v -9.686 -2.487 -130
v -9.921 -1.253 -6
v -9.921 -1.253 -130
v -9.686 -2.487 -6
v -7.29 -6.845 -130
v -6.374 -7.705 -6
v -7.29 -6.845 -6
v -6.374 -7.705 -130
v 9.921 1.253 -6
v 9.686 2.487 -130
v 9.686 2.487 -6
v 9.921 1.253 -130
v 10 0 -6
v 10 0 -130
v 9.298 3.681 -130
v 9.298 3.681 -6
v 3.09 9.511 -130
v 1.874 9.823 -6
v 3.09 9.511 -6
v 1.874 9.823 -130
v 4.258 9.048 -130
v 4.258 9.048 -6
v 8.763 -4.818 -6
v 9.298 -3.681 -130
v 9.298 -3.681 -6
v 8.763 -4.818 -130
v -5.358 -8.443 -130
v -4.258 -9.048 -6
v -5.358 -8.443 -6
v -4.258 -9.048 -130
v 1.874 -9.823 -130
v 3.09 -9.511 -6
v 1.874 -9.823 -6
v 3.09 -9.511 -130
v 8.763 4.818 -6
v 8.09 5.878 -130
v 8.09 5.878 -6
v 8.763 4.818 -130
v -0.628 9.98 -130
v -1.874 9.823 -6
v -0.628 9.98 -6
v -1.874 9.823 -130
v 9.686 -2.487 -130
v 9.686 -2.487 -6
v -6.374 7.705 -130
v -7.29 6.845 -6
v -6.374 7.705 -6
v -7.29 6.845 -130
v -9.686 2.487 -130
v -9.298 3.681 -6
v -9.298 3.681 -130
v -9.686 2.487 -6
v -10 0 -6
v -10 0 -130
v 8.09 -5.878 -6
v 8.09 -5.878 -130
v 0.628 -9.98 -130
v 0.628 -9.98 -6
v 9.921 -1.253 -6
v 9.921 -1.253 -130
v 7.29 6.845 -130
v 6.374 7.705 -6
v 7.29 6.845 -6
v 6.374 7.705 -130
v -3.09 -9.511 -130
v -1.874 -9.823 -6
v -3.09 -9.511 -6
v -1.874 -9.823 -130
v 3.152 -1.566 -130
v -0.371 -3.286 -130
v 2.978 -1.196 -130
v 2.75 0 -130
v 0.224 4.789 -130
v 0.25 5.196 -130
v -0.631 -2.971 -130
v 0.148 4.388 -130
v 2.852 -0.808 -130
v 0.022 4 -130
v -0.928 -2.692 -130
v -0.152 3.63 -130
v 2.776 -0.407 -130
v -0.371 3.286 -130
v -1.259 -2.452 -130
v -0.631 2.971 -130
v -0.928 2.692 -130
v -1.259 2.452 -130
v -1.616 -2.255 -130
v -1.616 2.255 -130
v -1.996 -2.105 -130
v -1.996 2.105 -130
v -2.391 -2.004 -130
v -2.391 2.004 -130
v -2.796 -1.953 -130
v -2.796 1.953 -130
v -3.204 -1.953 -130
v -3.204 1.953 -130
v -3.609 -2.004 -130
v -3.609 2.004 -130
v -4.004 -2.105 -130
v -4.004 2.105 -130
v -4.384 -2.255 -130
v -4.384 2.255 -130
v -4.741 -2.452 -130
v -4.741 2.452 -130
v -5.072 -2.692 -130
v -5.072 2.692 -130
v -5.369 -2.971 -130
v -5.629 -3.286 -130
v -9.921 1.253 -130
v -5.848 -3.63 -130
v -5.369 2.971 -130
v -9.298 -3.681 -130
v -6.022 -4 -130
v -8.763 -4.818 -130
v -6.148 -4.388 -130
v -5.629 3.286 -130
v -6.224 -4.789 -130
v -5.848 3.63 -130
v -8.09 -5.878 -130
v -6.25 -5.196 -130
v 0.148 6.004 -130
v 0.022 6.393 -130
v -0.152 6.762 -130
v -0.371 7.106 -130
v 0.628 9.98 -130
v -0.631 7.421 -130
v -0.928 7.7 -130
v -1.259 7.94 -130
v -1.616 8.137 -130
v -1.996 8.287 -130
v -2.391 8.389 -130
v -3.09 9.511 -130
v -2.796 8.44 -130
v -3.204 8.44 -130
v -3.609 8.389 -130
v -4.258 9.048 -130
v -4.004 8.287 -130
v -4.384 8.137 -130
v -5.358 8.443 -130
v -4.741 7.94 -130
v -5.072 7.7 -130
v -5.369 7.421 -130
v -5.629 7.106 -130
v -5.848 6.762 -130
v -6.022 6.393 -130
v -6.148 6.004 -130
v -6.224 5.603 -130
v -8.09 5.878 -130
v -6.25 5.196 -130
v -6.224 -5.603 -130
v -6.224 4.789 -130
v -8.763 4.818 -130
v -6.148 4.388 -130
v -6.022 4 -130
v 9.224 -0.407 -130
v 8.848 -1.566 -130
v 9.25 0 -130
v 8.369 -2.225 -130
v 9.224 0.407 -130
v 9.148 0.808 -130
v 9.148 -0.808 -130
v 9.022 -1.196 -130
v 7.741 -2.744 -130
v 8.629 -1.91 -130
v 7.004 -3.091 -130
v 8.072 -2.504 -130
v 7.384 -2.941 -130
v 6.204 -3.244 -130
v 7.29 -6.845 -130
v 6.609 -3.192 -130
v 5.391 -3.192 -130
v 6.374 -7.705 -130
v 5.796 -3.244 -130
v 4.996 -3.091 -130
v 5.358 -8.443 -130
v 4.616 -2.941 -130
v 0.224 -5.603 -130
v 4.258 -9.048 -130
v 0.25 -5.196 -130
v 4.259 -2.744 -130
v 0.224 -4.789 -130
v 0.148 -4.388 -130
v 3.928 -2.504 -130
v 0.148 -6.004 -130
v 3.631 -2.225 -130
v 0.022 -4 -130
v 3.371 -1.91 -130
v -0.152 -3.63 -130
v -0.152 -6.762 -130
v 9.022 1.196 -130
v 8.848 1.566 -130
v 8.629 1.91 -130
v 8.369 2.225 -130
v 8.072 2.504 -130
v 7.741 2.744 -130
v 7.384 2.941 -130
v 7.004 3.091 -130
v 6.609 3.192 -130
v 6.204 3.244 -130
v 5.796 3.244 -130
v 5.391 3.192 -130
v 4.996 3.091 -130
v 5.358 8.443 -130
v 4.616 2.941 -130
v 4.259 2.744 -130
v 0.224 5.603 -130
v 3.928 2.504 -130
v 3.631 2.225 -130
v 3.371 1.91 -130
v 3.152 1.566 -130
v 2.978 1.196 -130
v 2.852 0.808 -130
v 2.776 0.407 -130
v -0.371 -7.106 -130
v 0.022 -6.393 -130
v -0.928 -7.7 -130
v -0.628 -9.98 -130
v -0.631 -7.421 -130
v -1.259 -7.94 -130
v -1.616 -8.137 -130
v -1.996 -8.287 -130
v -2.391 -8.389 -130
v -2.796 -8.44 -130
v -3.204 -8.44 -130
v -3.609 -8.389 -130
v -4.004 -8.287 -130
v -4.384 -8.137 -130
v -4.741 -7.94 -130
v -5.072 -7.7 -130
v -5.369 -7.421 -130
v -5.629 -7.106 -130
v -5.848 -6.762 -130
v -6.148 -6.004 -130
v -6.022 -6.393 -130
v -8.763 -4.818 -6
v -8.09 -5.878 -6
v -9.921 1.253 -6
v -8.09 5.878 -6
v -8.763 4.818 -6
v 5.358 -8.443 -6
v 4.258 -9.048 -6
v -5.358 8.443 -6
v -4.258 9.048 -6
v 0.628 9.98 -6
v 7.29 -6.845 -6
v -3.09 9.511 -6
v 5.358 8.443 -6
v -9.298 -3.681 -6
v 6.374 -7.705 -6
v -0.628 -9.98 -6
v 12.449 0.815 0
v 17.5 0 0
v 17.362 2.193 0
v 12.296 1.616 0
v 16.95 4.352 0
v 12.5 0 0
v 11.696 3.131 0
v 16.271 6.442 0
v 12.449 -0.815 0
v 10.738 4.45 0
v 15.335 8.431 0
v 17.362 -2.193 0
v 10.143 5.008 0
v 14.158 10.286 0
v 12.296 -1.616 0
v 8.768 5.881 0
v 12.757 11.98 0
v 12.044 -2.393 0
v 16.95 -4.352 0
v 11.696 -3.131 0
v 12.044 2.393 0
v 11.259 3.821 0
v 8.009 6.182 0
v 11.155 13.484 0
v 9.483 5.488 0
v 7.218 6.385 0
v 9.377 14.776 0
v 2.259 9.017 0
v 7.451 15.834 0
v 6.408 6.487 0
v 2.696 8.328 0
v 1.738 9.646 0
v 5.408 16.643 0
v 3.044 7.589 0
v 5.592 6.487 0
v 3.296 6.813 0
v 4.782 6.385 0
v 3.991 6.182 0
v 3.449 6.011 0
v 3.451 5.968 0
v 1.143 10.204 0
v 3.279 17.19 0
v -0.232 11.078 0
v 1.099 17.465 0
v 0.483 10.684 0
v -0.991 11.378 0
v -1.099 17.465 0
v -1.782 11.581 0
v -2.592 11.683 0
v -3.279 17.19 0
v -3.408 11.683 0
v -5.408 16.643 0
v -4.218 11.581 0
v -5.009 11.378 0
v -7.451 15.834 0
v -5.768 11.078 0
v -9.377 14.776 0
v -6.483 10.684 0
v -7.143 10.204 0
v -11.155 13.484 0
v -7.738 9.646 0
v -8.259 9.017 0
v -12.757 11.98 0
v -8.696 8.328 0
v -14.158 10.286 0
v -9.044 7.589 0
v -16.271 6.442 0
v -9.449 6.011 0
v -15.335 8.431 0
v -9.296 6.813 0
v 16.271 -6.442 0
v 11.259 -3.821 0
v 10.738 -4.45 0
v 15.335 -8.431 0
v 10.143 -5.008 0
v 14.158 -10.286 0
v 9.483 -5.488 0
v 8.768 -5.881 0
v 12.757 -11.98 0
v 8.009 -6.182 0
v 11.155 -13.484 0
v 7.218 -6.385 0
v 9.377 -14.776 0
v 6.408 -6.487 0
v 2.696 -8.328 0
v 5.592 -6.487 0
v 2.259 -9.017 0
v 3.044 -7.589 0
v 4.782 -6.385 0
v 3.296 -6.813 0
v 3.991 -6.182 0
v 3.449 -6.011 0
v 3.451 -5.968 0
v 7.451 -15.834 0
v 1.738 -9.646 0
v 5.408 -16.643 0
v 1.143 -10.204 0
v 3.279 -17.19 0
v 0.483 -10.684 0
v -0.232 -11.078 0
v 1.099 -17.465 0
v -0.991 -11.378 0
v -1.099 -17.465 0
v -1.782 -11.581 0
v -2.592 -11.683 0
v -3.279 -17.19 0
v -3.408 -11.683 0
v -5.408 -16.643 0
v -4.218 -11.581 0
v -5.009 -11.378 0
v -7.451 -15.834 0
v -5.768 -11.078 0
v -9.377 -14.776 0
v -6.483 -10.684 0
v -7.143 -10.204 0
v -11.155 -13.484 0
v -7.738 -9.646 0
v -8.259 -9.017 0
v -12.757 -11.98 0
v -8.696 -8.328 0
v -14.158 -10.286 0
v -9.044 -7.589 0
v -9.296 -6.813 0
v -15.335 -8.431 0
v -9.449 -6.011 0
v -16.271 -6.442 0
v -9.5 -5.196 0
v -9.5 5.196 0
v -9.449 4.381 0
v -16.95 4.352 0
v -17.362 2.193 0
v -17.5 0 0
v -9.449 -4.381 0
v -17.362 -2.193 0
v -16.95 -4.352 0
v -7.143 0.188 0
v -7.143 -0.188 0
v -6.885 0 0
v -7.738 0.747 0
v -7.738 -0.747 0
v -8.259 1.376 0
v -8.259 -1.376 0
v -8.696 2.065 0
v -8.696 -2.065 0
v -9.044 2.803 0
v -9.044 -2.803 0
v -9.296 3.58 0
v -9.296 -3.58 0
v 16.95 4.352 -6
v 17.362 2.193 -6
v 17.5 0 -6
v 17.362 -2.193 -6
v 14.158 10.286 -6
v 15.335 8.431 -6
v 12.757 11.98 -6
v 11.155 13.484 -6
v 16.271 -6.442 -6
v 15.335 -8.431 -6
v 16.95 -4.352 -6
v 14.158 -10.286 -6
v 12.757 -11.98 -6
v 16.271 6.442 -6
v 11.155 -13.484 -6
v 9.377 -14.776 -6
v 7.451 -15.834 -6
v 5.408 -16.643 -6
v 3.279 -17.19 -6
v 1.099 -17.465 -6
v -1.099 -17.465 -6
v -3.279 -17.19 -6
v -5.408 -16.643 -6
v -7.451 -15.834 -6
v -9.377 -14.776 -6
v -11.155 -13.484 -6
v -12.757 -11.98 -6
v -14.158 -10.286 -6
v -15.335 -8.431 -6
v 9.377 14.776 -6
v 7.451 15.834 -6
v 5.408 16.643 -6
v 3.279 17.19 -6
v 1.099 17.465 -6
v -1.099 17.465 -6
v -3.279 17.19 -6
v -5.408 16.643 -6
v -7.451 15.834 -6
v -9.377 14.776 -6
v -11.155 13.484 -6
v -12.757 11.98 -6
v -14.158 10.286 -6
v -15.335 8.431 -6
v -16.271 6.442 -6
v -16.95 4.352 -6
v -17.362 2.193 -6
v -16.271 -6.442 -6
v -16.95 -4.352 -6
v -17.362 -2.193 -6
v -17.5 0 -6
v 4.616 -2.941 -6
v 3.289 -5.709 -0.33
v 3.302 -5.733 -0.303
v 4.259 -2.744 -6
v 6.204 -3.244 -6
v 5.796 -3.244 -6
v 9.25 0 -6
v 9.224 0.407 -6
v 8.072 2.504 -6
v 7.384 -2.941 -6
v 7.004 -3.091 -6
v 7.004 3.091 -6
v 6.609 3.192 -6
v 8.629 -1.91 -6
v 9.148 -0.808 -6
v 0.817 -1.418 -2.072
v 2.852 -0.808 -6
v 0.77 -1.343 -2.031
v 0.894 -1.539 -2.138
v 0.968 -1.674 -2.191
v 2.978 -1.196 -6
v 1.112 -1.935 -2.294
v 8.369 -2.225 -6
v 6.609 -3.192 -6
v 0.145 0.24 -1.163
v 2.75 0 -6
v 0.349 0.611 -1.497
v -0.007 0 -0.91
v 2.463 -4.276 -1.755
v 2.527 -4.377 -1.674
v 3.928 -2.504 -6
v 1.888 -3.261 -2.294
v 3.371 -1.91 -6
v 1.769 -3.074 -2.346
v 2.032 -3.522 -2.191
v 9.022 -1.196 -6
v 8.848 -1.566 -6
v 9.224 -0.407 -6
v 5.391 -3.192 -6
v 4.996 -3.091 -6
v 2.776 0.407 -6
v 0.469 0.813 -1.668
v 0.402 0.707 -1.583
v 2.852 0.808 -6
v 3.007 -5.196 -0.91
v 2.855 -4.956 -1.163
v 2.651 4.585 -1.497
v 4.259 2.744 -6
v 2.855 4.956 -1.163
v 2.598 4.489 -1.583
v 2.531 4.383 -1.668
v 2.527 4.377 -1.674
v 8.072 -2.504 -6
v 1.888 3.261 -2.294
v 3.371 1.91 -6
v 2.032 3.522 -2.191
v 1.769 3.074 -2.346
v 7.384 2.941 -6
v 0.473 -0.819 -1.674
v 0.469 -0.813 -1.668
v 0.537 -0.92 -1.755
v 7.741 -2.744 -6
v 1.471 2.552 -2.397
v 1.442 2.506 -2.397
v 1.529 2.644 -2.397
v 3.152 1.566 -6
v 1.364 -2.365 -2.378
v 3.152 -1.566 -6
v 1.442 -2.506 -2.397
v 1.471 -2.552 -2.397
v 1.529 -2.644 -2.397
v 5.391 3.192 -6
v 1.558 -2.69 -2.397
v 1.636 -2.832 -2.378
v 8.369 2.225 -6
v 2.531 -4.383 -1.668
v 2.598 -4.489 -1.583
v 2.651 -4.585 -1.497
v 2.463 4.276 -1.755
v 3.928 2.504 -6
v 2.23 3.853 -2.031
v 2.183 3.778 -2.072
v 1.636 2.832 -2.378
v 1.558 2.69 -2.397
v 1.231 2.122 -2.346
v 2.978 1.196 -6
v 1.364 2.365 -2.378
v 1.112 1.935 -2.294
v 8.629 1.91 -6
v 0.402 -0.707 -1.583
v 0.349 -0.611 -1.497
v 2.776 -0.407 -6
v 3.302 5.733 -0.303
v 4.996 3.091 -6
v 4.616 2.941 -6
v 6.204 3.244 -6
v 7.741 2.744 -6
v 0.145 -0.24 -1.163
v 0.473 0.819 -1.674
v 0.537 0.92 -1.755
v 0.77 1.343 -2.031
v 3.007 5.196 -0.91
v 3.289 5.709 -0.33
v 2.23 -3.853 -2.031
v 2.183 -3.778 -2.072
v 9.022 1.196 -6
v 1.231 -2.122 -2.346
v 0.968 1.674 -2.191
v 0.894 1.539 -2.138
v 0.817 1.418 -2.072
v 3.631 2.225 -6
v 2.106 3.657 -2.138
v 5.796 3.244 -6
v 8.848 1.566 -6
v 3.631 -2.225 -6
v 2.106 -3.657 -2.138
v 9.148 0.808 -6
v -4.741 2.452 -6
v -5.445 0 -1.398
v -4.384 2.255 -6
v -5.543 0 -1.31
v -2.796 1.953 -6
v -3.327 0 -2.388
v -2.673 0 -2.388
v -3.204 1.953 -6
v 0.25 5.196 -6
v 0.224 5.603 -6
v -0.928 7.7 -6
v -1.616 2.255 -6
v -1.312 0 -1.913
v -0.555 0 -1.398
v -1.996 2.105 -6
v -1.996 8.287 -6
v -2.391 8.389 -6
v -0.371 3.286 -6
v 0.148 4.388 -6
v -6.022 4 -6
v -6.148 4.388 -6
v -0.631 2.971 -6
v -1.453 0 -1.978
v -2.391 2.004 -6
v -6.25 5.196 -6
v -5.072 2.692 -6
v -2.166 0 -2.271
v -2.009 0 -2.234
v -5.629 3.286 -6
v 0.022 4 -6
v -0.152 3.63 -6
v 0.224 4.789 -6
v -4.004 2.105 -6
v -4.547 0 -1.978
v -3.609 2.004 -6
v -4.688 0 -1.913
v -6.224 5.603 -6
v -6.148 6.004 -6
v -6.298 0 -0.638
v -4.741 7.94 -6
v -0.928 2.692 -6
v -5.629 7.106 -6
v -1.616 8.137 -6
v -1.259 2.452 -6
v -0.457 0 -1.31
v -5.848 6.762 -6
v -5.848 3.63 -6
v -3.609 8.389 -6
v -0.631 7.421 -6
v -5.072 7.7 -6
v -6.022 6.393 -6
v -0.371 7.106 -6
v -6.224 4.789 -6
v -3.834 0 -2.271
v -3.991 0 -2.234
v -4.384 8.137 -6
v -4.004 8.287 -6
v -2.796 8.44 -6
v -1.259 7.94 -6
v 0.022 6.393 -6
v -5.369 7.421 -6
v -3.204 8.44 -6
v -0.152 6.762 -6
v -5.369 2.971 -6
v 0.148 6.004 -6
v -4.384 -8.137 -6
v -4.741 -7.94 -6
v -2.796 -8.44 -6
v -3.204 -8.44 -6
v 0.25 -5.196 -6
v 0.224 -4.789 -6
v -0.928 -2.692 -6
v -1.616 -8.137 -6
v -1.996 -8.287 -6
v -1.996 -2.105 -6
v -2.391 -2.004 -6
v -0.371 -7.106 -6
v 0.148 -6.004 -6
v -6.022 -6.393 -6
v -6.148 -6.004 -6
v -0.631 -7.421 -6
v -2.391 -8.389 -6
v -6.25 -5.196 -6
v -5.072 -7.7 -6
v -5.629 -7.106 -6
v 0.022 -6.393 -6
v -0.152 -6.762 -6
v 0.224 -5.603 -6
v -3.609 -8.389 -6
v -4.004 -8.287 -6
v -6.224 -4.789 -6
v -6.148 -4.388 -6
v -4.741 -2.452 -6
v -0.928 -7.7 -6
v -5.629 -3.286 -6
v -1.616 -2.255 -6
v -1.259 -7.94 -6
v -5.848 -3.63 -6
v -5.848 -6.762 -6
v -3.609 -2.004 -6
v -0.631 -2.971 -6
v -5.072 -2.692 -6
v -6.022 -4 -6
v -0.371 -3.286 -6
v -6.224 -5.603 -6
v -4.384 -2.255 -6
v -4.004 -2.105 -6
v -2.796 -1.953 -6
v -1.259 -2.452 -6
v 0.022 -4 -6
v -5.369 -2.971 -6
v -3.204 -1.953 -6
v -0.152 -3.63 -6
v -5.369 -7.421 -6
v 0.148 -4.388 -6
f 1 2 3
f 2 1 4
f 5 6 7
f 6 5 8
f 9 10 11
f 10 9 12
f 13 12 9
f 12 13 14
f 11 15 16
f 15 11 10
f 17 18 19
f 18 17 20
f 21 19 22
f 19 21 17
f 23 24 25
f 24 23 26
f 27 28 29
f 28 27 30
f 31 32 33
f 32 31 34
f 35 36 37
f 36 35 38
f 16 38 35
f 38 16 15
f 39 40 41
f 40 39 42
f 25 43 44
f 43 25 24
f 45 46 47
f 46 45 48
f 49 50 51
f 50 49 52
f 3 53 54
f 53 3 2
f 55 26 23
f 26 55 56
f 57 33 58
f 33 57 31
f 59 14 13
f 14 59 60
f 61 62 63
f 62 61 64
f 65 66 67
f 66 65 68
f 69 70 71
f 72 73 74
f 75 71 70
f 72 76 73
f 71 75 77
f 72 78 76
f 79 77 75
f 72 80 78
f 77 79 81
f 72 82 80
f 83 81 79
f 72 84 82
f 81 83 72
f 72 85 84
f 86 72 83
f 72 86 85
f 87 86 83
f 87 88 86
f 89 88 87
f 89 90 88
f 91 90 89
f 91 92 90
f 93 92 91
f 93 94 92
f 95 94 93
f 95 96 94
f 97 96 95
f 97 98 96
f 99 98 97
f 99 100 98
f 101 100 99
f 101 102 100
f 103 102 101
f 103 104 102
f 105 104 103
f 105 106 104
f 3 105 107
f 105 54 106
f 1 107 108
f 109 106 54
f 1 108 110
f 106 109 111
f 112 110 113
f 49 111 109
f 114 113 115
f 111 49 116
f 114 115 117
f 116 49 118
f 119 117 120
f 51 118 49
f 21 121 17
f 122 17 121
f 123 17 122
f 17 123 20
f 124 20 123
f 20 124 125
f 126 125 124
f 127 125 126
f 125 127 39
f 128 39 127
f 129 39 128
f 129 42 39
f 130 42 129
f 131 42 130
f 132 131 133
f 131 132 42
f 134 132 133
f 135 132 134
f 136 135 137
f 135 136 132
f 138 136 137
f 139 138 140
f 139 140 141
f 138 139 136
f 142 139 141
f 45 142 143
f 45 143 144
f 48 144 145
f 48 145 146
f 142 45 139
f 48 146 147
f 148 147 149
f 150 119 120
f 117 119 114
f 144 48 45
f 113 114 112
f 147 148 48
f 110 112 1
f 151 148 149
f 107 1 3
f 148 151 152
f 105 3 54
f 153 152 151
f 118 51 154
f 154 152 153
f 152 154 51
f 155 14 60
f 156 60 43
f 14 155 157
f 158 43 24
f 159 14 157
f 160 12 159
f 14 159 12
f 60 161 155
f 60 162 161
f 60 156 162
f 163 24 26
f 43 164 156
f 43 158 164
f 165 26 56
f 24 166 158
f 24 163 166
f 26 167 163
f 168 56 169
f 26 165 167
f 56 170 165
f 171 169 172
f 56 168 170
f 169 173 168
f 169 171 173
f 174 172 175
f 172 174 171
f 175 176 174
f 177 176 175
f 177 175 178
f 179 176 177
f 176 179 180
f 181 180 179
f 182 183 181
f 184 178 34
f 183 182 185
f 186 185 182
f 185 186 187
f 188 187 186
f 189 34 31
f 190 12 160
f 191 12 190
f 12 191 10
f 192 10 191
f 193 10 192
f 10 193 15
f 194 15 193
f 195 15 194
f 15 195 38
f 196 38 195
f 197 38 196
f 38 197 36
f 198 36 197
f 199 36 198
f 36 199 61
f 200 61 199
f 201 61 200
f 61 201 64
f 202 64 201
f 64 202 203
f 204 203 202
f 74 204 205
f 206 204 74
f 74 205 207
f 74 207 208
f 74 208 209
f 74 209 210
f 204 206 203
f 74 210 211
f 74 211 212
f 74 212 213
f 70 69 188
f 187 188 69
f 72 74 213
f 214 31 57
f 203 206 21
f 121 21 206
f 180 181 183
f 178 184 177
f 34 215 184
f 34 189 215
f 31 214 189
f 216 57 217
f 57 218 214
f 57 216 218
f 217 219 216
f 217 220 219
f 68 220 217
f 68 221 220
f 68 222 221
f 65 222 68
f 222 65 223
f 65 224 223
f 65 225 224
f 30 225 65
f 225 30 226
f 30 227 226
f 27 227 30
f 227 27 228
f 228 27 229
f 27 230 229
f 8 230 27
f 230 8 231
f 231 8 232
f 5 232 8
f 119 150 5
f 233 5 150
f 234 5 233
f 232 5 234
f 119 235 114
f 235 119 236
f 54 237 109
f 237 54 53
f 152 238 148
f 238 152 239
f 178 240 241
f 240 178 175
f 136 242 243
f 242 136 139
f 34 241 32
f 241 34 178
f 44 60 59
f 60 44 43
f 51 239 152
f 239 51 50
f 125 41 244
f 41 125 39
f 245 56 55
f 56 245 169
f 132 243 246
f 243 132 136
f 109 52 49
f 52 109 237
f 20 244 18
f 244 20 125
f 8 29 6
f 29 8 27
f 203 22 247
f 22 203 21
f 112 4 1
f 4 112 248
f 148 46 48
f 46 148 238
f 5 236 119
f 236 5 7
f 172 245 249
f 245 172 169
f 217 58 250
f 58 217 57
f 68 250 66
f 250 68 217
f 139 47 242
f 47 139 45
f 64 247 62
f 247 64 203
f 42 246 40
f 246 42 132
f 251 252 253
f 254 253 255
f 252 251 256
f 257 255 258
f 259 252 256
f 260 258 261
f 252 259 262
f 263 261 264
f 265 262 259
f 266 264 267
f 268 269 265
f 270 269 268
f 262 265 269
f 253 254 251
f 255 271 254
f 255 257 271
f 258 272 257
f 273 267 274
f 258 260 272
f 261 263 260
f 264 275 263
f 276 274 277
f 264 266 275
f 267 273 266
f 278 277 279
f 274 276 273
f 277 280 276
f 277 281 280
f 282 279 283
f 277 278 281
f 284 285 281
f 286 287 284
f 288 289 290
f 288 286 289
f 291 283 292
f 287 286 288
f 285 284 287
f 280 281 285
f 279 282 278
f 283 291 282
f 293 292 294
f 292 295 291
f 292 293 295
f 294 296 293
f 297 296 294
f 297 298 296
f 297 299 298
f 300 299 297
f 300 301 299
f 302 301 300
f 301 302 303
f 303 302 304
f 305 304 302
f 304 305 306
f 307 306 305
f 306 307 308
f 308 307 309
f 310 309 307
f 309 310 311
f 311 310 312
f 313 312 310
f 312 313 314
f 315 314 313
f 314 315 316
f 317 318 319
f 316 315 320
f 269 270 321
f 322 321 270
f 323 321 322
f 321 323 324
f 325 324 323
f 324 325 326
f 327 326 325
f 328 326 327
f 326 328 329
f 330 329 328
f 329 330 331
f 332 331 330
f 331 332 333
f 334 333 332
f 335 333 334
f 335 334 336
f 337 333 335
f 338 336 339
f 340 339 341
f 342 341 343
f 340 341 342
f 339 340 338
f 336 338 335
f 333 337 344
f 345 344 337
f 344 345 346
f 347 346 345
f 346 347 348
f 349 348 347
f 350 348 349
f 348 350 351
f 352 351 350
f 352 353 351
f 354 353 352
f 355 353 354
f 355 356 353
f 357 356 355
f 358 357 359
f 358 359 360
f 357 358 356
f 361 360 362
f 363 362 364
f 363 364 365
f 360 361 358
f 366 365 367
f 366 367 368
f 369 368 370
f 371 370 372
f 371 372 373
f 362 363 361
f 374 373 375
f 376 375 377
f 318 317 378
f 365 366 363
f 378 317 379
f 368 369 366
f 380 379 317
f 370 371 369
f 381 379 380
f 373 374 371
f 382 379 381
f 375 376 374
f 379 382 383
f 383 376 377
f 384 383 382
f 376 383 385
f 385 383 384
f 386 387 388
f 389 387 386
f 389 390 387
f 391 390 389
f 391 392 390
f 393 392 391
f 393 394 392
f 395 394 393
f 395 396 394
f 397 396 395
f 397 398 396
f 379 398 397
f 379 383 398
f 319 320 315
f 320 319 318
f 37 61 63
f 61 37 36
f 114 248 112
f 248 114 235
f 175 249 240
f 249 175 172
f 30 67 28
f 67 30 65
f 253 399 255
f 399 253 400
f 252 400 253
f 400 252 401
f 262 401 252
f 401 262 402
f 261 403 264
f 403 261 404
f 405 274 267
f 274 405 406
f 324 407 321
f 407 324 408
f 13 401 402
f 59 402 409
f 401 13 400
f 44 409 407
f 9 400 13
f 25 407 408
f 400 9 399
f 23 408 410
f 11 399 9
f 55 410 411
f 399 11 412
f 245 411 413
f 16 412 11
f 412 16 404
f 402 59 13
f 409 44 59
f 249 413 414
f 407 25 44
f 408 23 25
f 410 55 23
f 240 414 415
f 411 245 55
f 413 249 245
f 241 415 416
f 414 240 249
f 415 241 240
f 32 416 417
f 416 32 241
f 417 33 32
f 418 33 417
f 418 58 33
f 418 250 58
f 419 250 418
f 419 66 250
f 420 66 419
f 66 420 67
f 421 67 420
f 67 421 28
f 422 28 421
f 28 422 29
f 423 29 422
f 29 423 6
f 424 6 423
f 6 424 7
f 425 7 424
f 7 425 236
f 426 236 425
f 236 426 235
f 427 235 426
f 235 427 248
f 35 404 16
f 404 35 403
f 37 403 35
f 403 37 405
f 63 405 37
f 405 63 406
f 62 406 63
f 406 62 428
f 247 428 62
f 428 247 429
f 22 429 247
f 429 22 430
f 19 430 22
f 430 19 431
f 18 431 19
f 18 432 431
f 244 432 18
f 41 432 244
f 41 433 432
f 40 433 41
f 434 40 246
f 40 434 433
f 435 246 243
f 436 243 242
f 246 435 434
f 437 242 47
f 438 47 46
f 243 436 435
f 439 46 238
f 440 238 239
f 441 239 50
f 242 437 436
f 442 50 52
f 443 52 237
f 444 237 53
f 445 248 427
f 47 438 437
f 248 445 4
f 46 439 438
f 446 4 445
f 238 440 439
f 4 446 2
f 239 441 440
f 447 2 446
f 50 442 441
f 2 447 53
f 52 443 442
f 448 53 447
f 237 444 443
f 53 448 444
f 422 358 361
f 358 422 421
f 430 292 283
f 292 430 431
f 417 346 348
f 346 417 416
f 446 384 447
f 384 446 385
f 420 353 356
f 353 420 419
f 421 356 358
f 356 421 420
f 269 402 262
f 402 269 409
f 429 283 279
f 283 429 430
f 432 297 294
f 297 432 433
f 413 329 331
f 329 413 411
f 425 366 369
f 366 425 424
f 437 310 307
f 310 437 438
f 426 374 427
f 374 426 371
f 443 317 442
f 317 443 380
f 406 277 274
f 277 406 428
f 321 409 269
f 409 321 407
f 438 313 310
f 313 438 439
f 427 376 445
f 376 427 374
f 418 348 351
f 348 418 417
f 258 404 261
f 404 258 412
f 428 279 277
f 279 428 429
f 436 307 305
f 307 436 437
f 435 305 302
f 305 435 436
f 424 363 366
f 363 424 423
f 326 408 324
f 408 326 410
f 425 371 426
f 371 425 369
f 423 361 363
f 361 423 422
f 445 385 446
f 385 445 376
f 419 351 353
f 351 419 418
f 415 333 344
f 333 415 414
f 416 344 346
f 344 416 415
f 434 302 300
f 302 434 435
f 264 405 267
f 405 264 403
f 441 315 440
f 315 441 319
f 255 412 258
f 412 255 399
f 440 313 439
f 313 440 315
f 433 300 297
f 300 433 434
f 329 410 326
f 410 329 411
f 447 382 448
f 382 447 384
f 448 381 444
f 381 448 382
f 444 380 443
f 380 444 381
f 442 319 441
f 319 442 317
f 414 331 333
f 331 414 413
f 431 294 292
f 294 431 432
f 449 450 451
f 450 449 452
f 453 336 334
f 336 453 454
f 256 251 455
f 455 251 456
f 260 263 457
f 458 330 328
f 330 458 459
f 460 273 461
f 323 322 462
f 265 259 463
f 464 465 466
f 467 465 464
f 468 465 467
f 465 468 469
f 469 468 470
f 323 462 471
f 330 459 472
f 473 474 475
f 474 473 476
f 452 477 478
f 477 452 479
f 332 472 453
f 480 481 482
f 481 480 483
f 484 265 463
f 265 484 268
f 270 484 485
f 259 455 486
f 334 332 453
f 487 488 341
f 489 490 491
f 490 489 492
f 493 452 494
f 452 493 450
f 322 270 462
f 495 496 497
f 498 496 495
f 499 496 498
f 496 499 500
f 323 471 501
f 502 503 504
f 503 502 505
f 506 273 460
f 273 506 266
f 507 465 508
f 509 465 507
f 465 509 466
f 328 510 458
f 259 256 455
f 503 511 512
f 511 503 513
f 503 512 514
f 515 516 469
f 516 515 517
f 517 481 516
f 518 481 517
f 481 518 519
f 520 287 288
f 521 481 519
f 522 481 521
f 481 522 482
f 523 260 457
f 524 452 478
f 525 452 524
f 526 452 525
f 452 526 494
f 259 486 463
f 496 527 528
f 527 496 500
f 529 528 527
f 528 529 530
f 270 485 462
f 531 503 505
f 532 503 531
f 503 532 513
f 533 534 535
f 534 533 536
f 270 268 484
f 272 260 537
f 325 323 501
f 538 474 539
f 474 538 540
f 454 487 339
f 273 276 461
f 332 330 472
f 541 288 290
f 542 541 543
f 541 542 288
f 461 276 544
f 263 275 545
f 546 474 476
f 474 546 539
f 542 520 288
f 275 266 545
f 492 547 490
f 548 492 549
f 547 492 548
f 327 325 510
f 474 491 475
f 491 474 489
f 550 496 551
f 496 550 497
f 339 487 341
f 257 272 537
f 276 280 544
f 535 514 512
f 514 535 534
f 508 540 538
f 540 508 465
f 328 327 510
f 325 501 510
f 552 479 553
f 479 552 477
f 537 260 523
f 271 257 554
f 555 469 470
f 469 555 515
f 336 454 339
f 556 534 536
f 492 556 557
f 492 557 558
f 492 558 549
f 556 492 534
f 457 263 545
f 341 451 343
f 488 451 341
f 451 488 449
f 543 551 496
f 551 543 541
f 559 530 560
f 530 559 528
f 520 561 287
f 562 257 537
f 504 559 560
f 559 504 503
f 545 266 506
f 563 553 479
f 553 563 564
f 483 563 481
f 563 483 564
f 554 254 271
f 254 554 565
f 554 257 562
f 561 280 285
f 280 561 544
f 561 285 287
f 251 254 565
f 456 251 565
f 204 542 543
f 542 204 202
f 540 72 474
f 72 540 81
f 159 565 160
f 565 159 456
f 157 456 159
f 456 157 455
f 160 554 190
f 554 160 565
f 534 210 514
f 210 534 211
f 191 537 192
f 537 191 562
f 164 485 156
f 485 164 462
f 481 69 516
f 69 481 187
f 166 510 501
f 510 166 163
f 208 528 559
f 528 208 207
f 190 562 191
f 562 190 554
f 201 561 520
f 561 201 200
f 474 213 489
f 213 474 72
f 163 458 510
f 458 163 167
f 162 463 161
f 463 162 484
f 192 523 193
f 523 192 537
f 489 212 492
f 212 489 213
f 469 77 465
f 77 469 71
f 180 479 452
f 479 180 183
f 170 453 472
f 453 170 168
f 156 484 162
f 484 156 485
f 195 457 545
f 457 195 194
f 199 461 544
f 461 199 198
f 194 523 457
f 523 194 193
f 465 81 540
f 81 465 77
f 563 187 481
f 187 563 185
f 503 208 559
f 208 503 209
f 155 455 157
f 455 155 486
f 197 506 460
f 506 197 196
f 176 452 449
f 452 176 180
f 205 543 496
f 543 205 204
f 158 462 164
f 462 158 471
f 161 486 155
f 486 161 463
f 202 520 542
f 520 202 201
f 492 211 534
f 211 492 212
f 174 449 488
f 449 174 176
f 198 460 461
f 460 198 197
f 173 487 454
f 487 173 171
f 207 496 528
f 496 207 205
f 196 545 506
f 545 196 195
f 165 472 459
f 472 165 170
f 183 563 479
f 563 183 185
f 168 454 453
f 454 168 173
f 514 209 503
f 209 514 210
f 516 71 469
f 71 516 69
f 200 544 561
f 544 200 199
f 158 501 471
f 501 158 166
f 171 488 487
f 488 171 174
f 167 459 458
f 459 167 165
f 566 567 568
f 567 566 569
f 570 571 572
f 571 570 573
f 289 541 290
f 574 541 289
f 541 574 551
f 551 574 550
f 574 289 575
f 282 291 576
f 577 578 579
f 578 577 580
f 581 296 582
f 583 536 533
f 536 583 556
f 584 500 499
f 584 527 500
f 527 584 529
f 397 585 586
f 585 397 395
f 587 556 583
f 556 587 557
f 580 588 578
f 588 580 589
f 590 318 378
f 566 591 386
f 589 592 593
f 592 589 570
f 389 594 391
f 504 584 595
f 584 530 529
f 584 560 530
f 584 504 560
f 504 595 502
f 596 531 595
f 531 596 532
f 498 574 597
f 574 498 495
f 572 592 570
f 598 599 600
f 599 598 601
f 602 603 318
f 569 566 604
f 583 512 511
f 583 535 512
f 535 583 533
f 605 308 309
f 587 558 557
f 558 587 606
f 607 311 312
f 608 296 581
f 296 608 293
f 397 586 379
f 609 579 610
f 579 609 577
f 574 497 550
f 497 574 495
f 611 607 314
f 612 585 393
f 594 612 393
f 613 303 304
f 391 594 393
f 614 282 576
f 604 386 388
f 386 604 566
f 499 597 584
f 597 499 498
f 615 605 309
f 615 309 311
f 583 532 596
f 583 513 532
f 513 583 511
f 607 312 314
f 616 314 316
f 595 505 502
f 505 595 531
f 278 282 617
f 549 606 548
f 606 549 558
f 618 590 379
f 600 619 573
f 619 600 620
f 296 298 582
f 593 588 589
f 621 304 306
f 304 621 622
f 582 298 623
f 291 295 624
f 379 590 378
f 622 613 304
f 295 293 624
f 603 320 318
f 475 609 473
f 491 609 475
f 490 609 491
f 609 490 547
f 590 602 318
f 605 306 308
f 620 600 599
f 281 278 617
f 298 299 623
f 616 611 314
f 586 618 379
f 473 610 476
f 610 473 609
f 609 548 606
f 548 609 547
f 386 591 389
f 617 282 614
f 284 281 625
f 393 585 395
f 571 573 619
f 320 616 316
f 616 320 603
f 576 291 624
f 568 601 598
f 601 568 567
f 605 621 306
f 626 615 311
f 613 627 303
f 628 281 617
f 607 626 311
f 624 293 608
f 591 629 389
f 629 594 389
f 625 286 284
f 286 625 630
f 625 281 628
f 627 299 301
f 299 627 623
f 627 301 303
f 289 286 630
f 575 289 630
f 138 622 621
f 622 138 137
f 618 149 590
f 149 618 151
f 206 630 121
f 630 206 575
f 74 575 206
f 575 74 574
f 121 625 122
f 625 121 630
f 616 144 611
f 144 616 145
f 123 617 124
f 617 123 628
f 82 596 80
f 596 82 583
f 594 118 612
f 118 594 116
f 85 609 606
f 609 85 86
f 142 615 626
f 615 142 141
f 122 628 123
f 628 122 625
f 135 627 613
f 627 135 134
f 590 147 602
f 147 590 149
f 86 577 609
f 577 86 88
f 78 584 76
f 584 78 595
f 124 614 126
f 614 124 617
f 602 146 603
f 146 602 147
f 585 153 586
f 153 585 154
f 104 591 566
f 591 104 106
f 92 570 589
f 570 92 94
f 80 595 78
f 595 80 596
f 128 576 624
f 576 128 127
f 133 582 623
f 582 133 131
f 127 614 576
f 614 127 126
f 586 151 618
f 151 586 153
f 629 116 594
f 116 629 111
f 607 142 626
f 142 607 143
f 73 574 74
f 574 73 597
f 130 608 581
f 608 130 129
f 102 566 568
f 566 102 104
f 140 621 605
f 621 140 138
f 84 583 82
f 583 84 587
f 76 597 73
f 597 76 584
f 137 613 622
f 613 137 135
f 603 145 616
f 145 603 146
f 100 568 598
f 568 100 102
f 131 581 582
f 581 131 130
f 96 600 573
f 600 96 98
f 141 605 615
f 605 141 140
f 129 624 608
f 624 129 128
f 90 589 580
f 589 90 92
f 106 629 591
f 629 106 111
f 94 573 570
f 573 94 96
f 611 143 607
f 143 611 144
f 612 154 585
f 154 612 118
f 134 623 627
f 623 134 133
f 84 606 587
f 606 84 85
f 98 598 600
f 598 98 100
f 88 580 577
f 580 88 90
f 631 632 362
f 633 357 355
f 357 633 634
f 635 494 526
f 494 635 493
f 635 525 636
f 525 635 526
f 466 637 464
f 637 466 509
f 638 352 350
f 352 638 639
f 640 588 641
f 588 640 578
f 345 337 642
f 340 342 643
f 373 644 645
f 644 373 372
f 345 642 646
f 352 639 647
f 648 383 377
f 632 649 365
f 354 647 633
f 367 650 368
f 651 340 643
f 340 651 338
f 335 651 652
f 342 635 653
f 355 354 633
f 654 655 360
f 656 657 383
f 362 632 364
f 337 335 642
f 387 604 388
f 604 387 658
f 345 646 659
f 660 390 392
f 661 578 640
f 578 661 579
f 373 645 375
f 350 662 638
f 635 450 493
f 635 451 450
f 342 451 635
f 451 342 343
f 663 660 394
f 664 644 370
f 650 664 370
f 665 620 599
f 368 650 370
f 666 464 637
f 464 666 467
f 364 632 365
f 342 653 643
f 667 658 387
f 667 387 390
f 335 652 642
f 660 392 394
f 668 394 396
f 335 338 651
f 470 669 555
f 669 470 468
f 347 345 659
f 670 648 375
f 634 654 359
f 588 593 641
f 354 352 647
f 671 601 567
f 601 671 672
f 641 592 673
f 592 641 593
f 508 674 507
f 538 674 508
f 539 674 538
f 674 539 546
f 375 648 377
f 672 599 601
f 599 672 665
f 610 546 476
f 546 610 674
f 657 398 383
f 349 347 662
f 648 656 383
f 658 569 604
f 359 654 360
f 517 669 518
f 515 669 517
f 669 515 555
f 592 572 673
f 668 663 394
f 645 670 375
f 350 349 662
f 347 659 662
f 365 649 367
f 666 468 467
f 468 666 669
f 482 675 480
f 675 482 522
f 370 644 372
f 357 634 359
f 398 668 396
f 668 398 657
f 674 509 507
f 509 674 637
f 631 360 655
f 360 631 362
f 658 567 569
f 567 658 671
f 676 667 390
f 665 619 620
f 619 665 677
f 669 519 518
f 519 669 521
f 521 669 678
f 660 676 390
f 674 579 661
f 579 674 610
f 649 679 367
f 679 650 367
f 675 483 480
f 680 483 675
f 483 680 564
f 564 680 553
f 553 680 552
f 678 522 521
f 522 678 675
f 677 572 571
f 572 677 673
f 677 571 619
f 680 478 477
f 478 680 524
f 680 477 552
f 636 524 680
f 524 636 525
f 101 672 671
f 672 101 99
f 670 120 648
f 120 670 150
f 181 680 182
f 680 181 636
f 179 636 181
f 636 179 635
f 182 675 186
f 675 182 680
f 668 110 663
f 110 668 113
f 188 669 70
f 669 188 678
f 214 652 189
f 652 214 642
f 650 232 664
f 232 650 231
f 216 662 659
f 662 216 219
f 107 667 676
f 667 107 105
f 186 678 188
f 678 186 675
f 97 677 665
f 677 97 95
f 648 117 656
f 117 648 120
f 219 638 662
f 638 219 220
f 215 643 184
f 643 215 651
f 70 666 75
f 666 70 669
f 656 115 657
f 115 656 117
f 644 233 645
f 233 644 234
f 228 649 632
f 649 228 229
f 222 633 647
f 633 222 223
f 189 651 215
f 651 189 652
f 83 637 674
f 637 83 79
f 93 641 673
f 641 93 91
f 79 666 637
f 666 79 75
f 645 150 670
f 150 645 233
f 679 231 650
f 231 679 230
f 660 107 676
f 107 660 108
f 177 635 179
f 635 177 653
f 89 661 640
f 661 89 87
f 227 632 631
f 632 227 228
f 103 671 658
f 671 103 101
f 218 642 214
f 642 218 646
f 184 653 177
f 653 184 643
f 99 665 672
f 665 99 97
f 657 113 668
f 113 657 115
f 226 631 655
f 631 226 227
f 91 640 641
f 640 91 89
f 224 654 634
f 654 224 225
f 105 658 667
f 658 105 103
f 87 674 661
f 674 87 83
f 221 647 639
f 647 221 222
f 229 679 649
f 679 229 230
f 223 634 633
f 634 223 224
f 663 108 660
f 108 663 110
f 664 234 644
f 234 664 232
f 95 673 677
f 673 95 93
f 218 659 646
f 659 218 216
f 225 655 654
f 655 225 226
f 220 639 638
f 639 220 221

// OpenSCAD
$fn = 50;


difference() {
	union() {
		translate(v = [0, 0, -130.0000000000]) {
			cylinder(h = 130, r = 10.0000000000);
		}
		translate(v = [0, 0, -6.0000000000]) {
			cylinder(h = 6, r = 17.5000000000);
		}
	}
	union() {
		translate(v = [6.0000000000, 0.0000000000, 0]) {
			rotate(a = [0, 0, 0]) {
				difference() {
					union() {
						#translate(v = [0, 0, -130.0000000000]) {
							cylinder(h = 130, r = 2.2500000000);
						}
						#translate(v = [0, 0, -6]) {
							cylinder(h = 6, r = 10.0000000000, r1 = 3.2500000000, r2 = 6.5000000000);
						}
						#translate(v = [0, 0, -130.0000000000]) {
							cylinder(h = 130, r = 3.2500000000);
						}
						#translate(v = [0, 0, -130.0000000000]) {
							cylinder(h = 130, r = 2.2500000000);
						}
					}
					union();
				}
			}
		}
		translate(v = [-3.0000000000, 5.1961524227, 0]) {
			rotate(a = [0, 0, 0]) {
				difference() {
					union() {
						#translate(v = [0, 0, -130.0000000000]) {
							cylinder(h = 130, r = 2.2500000000);
						}
						#translate(v = [0, 0, -6]) {
							cylinder(h = 6, r = 10.0000000000, r1 = 3.2500000000, r2 = 6.5000000000);
						}
						#translate(v = [0, 0, -130.0000000000]) {
							cylinder(h = 130, r = 3.2500000000);
						}
						#translate(v = [0, 0, -130.0000000000]) {
							cylinder(h = 130, r = 2.2500000000);
						}
					}
					union();
				}
			}
		}
		translate(v = [-3.0000000000, -5.1961524227, 0]) {
			rotate(a = [0, 0, 0]) {
				difference() {
					union() {
						#translate(v = [0, 0, -130.0000000000]) {
							cylinder(h = 130, r = 2.2500000000);
						}
						#translate(v = [0, 0, -6]) {
							cylinder(h = 6, r = 10.0000000000, r1 = 3.2500000000, r2 = 6.5000000000);
						}
						#translate(v = [0, 0, -130.0000000000]) {
							cylinder(h = 130, r = 3.2500000000);
						}
						#translate(v = [0, 0, -130.0000000000]) {
							cylinder(h = 130, r = 2.2500000000);
						}
					}
					union();
				}
			}
		}
	}
}
